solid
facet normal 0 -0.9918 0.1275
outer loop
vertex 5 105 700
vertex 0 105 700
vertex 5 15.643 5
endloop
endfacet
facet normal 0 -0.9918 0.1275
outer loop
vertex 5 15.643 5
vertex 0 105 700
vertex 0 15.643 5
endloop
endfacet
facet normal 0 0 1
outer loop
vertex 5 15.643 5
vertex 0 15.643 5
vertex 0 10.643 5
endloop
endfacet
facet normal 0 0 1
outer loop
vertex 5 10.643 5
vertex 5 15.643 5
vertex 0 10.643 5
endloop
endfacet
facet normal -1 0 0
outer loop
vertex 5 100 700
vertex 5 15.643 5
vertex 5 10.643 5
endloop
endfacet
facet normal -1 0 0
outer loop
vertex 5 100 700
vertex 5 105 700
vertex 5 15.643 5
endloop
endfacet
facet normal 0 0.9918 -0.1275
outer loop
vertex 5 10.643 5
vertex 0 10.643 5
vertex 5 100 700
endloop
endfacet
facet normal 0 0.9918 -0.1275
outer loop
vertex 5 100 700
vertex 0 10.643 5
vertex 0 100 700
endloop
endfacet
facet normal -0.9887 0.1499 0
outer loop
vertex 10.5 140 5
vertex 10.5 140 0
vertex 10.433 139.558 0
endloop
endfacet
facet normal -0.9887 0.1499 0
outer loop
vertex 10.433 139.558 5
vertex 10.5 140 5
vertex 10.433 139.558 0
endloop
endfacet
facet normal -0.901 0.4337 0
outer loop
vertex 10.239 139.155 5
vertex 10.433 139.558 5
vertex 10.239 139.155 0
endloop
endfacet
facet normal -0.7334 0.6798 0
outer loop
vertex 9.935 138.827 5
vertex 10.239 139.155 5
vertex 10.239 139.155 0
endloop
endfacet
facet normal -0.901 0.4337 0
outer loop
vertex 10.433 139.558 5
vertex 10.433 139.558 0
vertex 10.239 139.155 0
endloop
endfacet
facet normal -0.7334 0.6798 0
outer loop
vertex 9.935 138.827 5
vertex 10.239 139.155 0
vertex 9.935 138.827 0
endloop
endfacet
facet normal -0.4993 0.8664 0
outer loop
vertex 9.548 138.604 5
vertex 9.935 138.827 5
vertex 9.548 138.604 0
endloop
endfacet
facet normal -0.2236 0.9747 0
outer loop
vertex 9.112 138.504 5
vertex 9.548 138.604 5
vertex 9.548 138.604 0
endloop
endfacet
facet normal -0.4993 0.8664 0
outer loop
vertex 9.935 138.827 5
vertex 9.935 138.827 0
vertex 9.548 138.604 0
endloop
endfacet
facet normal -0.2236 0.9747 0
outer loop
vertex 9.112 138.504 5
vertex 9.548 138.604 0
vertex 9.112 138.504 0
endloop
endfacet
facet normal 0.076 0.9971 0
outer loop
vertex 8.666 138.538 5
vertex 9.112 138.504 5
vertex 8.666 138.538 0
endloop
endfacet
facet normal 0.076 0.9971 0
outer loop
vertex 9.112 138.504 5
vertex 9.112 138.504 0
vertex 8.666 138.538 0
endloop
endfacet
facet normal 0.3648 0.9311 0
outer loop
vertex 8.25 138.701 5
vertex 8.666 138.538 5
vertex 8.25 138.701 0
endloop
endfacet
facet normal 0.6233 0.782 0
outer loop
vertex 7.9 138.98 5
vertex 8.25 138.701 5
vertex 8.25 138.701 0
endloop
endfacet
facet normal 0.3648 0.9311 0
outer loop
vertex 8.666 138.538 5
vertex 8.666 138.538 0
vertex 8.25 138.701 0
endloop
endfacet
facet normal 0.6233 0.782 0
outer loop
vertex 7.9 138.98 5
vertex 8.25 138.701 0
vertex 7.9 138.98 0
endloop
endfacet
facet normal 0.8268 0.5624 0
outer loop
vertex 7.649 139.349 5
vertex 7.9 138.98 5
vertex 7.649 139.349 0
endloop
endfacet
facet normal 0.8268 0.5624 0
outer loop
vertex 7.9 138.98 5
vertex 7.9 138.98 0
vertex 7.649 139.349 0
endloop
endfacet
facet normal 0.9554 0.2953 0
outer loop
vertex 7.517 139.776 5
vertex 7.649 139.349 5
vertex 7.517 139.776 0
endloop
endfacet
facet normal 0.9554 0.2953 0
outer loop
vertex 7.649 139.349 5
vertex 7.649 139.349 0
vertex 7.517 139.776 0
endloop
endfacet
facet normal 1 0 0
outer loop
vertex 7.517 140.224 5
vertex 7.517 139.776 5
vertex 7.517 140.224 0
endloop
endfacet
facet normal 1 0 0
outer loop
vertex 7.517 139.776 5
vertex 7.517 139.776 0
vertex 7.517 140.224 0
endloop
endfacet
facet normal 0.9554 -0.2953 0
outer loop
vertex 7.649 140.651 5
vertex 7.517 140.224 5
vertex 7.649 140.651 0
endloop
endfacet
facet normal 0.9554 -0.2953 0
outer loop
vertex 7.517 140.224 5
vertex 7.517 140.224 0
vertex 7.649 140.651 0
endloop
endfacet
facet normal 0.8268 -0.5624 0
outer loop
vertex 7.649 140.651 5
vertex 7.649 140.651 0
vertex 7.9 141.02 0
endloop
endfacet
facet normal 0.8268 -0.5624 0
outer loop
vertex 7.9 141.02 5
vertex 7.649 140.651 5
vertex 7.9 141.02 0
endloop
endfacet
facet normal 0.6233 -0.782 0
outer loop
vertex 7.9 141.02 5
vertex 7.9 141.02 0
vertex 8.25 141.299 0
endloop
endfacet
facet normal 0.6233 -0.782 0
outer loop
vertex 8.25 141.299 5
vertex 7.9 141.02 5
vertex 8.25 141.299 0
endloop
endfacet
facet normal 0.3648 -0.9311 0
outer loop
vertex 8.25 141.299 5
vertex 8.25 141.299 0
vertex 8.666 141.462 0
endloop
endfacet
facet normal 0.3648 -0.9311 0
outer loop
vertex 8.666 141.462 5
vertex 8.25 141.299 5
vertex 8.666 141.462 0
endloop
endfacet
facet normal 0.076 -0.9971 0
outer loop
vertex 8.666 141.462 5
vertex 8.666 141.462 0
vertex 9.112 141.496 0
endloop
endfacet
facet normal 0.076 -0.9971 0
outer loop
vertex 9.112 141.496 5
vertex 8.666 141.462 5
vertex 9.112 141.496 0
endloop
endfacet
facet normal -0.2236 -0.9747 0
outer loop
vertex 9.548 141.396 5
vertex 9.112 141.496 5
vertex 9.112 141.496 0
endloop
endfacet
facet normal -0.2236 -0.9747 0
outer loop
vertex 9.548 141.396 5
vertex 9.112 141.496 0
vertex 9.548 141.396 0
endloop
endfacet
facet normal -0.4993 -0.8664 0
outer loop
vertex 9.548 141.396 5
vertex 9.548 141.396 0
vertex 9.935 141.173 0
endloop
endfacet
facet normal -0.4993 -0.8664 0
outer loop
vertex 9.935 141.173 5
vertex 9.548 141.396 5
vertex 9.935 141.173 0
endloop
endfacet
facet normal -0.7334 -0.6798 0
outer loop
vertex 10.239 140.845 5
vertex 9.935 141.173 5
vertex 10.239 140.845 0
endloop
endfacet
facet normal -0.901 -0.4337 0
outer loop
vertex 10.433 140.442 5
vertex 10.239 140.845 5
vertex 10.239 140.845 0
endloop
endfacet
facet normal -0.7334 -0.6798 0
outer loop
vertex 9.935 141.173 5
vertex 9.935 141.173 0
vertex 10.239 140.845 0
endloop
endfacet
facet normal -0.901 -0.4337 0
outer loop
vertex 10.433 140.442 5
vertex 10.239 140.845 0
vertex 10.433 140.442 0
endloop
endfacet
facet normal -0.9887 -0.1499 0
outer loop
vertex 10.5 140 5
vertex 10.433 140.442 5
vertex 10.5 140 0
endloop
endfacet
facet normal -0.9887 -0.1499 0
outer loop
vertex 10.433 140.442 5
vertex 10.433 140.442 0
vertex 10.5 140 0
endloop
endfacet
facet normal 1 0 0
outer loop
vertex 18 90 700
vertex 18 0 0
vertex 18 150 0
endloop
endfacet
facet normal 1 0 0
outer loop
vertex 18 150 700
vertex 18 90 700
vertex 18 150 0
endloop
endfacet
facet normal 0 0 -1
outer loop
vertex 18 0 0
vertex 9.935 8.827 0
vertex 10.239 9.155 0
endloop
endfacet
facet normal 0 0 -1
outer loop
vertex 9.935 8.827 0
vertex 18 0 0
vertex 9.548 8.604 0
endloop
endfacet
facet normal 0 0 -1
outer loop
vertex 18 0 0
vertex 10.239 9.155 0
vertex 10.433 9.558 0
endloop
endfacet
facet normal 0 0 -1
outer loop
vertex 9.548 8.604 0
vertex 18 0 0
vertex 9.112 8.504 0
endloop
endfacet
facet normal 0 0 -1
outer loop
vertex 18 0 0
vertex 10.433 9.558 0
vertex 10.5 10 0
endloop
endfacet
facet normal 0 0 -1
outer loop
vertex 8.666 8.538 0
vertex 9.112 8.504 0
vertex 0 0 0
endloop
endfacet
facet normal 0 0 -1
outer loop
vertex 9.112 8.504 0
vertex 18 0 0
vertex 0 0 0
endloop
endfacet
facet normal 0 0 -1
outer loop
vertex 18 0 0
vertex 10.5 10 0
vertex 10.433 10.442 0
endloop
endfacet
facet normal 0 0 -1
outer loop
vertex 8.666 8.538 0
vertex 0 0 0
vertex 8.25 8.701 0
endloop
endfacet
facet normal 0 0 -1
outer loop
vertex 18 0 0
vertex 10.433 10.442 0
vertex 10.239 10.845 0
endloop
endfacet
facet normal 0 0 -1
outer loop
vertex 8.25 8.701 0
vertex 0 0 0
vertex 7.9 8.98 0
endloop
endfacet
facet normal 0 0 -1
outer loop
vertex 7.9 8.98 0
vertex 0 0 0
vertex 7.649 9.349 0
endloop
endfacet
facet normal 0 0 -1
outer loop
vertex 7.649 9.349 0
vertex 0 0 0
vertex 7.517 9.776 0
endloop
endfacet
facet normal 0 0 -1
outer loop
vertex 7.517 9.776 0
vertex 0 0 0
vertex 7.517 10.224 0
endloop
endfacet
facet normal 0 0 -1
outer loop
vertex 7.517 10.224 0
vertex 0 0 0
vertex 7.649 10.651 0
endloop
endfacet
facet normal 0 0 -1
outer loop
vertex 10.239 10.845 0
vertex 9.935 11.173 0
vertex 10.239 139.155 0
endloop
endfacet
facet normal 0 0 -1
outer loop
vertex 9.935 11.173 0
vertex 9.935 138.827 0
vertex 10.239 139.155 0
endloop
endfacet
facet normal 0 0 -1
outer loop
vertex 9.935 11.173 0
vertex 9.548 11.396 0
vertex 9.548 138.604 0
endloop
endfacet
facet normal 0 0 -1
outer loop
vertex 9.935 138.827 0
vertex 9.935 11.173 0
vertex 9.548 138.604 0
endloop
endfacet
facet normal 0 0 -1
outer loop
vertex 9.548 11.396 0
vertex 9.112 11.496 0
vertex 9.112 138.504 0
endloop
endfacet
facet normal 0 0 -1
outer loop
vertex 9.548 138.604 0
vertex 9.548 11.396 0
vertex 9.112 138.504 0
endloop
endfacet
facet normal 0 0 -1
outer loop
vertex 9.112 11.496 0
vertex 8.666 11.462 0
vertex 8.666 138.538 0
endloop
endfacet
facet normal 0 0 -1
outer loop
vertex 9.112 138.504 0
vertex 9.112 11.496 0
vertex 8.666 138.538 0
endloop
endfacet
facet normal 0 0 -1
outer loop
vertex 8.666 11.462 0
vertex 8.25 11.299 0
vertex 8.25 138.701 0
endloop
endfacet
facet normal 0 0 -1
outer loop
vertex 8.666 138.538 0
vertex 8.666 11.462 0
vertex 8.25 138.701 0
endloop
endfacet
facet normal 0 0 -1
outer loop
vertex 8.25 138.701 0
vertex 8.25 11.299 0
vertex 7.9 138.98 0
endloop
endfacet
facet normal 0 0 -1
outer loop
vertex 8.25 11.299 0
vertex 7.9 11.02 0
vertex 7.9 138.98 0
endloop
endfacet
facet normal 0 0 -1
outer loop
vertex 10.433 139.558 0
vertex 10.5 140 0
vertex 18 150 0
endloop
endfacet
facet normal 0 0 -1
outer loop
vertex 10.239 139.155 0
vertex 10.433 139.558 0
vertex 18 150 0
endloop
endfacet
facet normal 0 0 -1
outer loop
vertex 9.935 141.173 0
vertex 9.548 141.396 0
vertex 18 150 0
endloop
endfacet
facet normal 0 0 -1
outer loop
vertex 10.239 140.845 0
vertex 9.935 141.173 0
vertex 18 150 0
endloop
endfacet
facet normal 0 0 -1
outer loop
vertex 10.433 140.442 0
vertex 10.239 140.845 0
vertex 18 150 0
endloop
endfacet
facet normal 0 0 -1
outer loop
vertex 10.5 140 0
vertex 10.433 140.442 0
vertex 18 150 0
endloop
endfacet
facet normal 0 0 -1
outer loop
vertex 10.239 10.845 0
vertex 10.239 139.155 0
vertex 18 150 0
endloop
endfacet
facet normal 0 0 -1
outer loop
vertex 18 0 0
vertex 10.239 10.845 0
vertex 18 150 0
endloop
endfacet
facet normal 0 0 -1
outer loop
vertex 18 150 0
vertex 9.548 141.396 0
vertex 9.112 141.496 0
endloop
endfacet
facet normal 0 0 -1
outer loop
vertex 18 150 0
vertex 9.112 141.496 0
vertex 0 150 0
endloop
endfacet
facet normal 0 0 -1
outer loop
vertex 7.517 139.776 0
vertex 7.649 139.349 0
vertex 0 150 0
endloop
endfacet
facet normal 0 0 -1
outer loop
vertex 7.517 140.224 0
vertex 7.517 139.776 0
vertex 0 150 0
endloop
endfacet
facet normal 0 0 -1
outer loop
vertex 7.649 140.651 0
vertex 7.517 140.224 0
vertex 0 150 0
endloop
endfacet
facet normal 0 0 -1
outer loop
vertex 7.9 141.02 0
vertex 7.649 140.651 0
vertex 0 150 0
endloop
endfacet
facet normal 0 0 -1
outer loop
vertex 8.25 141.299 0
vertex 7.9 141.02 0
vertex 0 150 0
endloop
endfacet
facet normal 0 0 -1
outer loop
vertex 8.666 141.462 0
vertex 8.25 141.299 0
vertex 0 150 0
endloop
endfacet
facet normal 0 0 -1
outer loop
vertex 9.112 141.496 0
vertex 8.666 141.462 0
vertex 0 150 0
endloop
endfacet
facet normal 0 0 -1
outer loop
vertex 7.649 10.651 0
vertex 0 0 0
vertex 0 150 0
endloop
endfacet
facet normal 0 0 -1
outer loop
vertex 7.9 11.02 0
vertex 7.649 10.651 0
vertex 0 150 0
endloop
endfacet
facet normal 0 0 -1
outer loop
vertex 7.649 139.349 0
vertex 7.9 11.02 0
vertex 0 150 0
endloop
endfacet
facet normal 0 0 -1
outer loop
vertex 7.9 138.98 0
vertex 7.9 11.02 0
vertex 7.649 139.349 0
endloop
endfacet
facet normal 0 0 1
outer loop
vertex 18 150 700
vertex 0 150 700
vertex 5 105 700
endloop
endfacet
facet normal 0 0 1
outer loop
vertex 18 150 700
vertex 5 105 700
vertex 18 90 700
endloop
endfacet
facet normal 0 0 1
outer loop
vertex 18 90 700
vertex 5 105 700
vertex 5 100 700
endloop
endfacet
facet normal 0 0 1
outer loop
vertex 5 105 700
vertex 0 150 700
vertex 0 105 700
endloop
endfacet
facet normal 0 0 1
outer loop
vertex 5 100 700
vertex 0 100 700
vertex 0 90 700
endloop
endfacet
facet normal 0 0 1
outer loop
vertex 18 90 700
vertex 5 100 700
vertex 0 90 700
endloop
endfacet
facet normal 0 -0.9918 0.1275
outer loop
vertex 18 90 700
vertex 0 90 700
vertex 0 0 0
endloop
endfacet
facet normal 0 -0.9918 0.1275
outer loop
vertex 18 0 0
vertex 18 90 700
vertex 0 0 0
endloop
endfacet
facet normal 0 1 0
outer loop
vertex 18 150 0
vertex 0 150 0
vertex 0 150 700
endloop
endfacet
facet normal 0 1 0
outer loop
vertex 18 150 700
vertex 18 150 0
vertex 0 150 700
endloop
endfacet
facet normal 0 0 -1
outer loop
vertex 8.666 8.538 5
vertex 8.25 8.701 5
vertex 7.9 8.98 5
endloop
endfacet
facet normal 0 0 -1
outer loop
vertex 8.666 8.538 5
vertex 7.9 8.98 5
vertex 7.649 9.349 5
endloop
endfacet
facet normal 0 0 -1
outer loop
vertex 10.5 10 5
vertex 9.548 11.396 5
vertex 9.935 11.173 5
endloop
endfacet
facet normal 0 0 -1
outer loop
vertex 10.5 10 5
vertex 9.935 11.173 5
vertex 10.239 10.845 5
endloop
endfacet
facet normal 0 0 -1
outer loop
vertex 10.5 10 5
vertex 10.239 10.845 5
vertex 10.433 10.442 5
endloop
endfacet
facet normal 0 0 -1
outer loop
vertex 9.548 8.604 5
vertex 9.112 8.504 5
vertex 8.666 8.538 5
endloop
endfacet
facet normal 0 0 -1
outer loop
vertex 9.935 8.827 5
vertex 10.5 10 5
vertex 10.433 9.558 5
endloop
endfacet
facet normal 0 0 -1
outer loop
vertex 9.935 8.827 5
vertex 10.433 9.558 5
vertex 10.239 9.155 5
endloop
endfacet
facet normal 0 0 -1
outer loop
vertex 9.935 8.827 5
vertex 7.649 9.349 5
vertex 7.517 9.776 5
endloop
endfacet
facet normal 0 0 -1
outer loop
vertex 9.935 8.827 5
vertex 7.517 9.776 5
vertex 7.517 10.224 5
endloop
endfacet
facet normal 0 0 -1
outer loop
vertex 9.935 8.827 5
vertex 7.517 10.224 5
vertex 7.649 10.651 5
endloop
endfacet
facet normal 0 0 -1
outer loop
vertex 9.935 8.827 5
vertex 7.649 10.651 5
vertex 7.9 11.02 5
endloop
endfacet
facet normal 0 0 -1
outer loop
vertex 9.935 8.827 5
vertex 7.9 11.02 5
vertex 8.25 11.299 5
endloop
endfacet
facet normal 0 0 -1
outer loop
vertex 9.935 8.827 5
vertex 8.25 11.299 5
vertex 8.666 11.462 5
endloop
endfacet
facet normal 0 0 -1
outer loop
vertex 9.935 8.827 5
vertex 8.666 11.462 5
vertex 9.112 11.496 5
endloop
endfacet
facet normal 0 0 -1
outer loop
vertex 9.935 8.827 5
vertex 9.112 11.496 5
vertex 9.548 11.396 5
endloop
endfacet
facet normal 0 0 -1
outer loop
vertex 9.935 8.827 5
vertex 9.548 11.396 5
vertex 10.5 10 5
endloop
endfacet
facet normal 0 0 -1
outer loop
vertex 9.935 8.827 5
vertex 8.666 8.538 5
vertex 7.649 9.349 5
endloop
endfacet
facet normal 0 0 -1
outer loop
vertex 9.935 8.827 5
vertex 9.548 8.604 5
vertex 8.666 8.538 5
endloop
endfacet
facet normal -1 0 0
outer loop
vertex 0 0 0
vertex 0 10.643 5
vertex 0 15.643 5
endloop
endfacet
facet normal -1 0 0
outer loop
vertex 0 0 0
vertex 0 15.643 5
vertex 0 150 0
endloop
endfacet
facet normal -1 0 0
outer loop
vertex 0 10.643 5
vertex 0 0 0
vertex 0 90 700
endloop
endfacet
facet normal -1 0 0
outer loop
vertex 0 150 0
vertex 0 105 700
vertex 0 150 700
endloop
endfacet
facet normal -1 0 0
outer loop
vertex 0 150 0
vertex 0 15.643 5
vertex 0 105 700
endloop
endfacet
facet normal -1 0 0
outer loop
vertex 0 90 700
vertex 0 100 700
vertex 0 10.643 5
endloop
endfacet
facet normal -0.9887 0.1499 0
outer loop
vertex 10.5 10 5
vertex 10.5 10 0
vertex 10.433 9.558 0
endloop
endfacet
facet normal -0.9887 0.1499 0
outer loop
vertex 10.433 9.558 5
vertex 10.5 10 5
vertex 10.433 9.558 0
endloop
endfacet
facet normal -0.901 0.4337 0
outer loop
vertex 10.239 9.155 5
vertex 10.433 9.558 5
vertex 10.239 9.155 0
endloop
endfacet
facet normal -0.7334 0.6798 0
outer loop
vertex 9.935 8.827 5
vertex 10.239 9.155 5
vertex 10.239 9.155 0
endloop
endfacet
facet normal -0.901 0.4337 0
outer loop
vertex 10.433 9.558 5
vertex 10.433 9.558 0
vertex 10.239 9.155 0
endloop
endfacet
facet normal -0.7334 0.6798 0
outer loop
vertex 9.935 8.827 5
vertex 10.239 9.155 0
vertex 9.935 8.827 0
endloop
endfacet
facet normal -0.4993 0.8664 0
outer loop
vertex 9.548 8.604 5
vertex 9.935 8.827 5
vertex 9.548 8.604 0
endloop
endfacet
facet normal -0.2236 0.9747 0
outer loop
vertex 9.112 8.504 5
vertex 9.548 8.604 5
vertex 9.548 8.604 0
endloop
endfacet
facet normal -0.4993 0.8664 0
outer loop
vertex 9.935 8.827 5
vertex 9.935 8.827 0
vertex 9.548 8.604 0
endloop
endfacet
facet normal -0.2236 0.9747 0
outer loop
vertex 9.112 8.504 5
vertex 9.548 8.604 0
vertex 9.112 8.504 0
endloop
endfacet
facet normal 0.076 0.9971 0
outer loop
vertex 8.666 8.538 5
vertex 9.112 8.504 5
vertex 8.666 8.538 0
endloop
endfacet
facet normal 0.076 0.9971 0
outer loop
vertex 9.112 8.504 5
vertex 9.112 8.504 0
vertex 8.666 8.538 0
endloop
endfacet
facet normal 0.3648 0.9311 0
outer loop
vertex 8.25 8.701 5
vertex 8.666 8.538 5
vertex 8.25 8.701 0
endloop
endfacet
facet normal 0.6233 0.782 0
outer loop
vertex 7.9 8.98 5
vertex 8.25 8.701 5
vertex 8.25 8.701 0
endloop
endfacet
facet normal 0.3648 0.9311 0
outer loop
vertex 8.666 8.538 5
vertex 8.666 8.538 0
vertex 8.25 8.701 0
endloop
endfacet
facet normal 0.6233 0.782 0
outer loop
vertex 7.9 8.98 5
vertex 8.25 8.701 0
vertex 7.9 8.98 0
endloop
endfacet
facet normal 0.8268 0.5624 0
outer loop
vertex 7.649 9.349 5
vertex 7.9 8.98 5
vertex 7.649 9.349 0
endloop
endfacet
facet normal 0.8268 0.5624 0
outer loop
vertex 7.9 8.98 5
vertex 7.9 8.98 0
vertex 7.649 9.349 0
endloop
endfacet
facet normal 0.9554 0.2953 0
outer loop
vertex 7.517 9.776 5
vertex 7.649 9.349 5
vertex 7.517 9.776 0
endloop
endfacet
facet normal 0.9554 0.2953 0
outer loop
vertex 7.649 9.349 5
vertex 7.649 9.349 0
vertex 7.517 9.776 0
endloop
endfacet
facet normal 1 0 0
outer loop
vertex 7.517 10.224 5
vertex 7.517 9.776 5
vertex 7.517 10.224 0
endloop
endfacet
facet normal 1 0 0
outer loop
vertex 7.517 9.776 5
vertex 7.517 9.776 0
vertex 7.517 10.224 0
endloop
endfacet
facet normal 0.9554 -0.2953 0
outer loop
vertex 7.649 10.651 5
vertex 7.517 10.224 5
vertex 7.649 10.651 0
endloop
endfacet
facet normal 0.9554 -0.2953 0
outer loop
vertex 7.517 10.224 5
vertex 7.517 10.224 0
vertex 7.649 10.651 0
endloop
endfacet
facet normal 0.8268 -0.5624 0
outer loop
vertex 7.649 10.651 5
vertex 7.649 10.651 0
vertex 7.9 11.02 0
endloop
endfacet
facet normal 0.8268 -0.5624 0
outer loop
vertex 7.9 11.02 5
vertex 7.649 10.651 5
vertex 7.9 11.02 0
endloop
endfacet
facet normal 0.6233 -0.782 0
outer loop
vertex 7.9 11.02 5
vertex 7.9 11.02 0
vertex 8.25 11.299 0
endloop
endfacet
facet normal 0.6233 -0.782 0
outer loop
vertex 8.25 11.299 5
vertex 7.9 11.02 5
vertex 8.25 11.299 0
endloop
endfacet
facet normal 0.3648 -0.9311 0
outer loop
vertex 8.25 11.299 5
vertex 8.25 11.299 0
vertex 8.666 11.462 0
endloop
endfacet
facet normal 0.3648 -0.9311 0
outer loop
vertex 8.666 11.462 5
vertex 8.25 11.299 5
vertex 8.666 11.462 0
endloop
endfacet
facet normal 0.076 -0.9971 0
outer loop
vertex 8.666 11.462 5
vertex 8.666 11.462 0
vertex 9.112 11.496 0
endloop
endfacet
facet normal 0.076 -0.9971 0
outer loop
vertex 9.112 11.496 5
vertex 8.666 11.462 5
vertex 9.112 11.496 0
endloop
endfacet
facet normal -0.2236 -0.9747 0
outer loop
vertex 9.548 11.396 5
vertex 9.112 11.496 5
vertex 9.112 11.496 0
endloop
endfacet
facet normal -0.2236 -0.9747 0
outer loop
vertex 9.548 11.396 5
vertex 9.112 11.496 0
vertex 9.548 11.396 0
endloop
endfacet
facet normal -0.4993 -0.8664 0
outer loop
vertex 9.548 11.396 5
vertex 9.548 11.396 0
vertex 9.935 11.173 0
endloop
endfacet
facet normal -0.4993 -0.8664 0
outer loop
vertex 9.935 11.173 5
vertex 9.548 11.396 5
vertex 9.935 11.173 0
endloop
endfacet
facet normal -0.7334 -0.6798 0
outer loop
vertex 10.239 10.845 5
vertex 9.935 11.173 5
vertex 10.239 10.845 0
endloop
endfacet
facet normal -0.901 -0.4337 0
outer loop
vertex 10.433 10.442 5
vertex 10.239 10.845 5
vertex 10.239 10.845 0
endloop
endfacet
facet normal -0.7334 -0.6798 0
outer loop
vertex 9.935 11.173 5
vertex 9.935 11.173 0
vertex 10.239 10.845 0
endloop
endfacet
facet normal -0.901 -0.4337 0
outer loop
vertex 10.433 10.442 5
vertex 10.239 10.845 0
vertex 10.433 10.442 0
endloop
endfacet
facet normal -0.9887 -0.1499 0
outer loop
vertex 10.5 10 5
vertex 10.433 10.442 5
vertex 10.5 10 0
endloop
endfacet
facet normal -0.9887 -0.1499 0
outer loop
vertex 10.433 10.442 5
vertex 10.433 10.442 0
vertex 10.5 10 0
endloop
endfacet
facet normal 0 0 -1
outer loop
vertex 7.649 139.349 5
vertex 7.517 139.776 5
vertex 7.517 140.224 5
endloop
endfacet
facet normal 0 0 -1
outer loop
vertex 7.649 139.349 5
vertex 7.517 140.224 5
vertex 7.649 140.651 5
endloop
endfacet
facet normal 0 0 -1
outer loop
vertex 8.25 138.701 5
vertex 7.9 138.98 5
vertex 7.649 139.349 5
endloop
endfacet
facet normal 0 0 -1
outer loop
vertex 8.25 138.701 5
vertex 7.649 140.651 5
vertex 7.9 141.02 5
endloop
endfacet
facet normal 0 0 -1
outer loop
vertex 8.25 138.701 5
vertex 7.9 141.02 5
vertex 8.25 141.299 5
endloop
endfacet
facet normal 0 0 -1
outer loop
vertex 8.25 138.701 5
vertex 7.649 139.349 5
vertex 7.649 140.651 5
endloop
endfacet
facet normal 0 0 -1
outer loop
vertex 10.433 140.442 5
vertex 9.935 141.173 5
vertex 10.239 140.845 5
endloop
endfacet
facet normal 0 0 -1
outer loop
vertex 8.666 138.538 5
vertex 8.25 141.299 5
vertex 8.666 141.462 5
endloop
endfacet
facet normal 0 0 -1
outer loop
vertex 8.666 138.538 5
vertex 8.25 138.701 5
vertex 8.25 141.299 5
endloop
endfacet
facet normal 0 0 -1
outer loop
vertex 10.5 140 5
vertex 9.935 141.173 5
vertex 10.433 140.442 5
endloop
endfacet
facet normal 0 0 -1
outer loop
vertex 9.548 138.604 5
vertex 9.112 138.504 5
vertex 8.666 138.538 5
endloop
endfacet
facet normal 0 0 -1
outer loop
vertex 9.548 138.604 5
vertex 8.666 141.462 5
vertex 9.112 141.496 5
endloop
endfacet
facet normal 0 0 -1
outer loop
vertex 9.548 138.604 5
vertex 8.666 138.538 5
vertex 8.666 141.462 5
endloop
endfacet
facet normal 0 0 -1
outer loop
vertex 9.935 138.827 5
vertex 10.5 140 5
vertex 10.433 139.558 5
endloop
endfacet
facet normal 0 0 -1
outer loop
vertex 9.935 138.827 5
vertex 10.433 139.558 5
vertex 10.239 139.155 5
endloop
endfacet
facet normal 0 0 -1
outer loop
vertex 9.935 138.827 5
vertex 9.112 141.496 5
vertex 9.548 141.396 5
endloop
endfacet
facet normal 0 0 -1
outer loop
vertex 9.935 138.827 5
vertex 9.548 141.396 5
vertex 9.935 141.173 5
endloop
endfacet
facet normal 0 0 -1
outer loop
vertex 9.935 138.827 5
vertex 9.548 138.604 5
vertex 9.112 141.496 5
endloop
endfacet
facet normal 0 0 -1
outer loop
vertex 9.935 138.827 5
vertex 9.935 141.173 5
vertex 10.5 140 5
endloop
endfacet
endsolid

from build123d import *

# Parameters (mm, degrees)
F1_DEPTH = 18
F3_DEPTH = 5
F4_R     = 1.5
F5_DEPTH = 5


with BuildPart() as f1:
    # F0 (on Right) → F1 (new body)
    with BuildSketch(Plane.YZ):
        Polygon((90, 700), (0, 0), (150, 0), (150, 700), align=None)
    extrude(amount=F1_DEPTH)

    # F2 (on face) → F3 (cut)
    with BuildSketch(Plane(origin=(0, 0, 0), x_dir=(0, -1, 0), z_dir=(-1, 0, 0))):
        Polygon((-15.642857, 5), (-10.642857, 5), (-100, 700), (-105, 700), align=None)
    extrude(amount=-F3_DEPTH, mode=Mode.SUBTRACT)

    # F4 (on face) → F5 (cut)
    with BuildSketch(Plane(origin=(0, 0, 0), x_dir=(1, 0, 0), z_dir=(0, 0, -1))):
        with Locations((9, -10)):
            Circle(F4_R)
        with Locations((9, -140)):
            Circle(F4_R)
    extrude(amount=-F5_DEPTH, mode=Mode.SUBTRACT)


solid = f1.part
